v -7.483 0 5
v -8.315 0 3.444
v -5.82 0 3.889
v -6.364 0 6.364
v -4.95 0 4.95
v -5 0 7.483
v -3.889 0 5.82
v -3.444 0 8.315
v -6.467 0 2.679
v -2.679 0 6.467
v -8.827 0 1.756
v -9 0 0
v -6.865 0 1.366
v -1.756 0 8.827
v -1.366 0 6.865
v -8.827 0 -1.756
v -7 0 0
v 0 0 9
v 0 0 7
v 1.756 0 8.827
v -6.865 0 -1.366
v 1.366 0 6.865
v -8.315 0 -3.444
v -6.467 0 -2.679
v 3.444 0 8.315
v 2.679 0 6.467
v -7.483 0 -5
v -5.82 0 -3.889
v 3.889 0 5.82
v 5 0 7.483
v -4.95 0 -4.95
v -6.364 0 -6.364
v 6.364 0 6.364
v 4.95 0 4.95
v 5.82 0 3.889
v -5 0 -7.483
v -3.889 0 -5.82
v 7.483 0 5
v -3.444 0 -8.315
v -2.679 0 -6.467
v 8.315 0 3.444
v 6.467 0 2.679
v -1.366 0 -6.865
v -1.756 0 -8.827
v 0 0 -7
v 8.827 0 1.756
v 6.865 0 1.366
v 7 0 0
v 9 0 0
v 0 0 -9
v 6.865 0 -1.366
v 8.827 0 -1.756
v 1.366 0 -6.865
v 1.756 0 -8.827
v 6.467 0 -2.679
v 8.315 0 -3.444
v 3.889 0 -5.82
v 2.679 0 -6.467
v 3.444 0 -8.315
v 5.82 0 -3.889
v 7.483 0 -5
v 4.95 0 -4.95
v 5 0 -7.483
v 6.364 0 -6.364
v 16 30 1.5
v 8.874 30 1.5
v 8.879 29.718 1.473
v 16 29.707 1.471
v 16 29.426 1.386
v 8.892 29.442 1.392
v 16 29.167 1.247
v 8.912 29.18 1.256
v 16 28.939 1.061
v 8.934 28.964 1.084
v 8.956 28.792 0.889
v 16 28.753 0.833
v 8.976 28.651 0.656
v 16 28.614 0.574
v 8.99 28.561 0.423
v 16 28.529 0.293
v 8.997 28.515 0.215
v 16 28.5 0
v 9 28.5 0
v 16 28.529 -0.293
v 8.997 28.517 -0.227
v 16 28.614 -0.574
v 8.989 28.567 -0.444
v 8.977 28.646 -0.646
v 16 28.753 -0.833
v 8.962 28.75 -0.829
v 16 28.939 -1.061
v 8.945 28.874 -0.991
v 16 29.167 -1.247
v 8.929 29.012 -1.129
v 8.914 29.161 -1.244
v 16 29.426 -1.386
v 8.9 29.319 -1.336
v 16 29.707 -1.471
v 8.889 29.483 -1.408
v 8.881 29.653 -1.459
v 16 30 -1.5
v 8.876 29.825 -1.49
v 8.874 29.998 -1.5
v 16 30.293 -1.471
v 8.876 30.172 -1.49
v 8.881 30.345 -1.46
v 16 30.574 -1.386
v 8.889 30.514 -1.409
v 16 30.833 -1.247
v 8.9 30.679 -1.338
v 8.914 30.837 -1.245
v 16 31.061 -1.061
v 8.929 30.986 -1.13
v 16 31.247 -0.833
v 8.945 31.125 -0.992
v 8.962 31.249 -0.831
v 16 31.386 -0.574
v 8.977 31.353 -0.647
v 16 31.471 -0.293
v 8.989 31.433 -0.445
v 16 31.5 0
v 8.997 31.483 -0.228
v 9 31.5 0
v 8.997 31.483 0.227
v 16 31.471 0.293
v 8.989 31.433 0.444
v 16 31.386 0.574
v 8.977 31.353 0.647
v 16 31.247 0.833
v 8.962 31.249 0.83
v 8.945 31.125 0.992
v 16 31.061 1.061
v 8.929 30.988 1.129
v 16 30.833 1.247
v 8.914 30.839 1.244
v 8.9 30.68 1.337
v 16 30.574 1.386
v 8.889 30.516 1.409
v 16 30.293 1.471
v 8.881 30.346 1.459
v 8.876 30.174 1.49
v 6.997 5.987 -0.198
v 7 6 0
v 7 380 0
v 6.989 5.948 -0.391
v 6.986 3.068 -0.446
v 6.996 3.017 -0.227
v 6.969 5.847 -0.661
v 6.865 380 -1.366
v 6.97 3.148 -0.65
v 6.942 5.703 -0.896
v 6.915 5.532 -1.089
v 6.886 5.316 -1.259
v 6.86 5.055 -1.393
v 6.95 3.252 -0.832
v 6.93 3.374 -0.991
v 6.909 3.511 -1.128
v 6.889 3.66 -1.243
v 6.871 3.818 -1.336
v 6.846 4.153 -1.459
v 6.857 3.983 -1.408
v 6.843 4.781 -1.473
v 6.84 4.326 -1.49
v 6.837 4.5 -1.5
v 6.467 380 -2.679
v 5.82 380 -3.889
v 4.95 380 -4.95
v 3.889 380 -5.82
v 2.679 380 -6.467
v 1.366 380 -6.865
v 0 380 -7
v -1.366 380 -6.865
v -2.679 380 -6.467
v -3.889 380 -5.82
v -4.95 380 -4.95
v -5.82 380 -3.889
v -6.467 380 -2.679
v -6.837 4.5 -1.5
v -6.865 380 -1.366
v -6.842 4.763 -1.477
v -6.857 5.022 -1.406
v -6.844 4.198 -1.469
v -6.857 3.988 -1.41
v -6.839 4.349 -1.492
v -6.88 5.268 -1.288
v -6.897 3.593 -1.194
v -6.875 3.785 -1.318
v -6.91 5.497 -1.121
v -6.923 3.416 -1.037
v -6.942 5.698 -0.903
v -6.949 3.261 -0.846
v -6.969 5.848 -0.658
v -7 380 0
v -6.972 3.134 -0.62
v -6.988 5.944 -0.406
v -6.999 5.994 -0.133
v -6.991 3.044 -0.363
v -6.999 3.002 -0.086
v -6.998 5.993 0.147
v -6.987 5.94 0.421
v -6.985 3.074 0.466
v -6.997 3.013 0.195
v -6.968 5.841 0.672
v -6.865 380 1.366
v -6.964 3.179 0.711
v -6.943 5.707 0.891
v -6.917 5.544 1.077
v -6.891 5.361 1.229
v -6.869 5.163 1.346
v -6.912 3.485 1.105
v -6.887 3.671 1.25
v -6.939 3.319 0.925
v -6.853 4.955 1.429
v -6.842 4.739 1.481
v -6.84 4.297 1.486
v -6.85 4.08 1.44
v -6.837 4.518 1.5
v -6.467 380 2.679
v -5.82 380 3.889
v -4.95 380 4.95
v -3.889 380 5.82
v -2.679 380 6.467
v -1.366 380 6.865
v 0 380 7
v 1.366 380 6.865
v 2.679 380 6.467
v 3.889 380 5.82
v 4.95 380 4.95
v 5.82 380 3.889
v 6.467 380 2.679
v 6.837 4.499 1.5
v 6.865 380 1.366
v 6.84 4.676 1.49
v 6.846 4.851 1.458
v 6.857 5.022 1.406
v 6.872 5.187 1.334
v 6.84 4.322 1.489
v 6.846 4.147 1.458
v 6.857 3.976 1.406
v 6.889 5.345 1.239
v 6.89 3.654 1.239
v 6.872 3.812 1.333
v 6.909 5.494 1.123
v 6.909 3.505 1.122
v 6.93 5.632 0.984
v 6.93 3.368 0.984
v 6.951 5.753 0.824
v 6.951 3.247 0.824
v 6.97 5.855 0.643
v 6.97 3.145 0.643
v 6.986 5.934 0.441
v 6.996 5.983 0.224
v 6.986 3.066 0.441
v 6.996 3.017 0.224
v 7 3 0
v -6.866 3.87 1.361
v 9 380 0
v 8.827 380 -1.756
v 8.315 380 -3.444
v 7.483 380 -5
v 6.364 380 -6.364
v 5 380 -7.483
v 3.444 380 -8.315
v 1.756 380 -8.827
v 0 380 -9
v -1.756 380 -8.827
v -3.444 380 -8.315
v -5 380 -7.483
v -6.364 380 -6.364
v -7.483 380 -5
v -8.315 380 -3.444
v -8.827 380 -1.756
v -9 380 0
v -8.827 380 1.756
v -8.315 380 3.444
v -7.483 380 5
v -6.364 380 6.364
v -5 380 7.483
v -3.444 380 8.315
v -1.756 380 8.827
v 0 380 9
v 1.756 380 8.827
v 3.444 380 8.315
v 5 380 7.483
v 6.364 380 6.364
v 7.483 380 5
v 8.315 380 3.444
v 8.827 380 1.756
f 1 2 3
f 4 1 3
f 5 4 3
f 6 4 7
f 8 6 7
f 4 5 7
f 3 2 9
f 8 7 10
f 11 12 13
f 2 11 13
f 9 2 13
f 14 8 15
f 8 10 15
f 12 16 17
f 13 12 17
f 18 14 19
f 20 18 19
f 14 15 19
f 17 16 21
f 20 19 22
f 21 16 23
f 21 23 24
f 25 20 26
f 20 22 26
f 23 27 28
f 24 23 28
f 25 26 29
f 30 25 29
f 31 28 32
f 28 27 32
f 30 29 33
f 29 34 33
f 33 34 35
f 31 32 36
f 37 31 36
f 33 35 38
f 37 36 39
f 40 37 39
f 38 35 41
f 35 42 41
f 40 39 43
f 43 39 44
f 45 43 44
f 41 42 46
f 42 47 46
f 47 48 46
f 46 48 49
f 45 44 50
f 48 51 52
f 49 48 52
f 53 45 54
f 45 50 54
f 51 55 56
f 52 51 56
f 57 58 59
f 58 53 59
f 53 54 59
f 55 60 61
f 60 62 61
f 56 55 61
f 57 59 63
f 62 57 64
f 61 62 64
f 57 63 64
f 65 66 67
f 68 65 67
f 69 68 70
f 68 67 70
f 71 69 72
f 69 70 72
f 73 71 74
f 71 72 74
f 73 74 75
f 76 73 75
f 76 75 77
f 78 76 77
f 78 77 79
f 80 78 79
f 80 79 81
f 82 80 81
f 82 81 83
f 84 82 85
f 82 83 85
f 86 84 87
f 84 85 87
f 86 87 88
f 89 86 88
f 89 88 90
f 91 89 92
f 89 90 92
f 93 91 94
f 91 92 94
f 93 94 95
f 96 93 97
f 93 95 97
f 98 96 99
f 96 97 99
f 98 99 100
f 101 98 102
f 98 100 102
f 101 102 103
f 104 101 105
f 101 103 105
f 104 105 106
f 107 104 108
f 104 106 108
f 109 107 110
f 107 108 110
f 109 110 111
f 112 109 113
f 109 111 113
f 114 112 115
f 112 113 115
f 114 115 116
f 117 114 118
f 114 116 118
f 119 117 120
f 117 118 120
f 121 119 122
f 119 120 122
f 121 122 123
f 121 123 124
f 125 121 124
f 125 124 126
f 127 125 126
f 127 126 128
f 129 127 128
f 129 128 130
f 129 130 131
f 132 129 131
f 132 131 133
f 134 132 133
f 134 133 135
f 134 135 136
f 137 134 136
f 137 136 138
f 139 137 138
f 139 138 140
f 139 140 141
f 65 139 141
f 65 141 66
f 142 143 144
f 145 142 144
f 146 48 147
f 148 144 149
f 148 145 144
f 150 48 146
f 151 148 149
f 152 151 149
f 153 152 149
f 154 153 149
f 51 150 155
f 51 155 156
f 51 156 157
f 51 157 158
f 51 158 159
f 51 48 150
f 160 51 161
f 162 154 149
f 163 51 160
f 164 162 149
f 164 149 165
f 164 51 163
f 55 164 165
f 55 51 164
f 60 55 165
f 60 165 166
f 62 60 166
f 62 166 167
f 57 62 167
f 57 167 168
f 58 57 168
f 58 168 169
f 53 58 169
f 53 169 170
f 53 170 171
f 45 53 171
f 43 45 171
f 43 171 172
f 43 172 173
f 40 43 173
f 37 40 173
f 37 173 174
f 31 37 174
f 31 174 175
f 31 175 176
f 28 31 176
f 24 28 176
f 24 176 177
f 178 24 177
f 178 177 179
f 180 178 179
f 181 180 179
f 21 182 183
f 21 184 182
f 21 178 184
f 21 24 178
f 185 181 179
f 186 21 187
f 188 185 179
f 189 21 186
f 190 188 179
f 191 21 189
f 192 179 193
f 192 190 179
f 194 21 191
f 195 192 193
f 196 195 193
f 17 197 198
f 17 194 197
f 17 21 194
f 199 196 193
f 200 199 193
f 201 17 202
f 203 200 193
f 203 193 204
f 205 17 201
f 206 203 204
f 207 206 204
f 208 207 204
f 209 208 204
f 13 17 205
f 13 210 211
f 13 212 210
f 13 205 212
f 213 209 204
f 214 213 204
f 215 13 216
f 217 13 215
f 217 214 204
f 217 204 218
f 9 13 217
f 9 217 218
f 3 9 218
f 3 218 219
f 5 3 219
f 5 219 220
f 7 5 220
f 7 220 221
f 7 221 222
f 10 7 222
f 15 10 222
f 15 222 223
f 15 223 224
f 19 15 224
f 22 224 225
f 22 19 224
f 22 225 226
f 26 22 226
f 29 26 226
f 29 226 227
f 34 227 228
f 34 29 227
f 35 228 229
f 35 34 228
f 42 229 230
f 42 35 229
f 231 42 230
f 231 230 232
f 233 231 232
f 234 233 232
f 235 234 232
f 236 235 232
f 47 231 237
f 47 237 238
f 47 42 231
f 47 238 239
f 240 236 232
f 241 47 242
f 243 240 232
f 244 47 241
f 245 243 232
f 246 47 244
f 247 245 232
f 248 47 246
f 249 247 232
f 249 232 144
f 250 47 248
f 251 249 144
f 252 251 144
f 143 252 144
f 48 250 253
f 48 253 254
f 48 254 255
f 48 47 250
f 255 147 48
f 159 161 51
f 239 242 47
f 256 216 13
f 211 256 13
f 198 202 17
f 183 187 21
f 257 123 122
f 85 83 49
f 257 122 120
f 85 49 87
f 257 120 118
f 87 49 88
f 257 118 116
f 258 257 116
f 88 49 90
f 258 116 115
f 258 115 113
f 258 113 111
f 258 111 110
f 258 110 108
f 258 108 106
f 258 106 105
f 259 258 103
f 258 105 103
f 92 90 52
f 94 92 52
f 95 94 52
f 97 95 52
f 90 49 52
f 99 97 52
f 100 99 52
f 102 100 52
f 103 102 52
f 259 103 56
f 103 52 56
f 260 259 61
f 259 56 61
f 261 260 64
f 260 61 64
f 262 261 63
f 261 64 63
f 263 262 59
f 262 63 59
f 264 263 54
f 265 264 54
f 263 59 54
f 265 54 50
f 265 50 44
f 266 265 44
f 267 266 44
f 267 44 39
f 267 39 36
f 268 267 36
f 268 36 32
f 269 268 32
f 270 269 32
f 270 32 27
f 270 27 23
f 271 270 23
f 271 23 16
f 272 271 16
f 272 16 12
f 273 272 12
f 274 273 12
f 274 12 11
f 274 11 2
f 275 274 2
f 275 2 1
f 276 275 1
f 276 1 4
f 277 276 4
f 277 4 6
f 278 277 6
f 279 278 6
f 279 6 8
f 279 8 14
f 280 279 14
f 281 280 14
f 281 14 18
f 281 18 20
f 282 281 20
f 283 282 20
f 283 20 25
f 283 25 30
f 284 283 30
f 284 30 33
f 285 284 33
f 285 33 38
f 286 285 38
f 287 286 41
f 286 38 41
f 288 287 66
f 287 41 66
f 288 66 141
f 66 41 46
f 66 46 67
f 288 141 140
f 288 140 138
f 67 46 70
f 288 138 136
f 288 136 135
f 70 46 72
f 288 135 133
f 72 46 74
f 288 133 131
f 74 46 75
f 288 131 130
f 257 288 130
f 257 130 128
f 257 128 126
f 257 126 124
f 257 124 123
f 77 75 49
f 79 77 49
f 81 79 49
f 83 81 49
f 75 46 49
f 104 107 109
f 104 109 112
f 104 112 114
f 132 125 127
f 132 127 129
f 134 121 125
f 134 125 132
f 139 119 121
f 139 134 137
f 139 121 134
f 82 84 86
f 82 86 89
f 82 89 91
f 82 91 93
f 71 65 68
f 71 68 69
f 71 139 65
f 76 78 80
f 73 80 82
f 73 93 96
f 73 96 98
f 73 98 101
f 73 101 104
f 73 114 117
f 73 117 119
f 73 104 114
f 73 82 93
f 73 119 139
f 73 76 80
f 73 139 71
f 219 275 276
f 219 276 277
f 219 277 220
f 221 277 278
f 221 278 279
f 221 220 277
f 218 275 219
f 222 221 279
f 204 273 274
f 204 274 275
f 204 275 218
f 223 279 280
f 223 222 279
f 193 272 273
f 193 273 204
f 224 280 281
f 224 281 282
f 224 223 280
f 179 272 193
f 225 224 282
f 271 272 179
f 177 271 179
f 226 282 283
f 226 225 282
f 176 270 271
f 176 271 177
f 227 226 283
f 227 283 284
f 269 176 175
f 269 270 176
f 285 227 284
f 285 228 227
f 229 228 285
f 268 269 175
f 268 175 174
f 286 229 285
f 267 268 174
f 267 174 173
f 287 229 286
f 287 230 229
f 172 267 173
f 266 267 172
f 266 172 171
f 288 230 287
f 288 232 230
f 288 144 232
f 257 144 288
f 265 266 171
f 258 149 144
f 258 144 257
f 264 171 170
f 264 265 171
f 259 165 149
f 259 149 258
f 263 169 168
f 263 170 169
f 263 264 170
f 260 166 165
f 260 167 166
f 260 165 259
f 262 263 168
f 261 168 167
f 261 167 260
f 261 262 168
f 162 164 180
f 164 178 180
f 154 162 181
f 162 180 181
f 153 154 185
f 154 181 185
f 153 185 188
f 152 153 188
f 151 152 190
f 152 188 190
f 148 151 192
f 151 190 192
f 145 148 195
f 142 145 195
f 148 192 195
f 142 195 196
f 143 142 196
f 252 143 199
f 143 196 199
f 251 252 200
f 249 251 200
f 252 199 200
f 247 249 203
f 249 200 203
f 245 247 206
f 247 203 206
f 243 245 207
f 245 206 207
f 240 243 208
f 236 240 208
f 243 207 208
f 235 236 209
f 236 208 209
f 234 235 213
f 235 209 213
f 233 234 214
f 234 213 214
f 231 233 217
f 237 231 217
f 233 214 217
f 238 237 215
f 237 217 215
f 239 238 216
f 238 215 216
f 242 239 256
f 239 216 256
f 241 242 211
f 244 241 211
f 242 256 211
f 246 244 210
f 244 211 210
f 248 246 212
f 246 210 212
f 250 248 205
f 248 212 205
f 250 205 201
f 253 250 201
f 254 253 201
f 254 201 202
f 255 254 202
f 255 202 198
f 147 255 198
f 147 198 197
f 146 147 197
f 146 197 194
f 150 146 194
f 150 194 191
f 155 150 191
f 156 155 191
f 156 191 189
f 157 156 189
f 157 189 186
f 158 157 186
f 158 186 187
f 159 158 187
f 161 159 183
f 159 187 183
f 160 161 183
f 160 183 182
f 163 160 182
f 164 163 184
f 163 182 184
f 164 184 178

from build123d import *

# Parameters (mm, degrees)
SKETCH1_R                            = 9
SKETCH1_R_2                          = 7
EXTRUDE_THIN1_DEPTH                  = 380
BOSS_EXTRUDE1_REACH                  = 382.213
BOSS_EXTRUDE1_END_RADIUS             = 7
SKETCH2_R                            = 1.5
BOSS_EXTRUDE1_DIRECTION_2_REACH      = 382.213
BOSS_EXTRUDE1_DIRECTION_2_END_RADIUS = 7
BOSS_EXTRUDE2_START                  = 8
SKETCH3_R                            = 1.5
BOSS_EXTRUDE2_DEPTH                  = 8


with BuildPart() as part:
    # Sketch1 → Extrude-Thin1 (new body)
    with BuildSketch(Plane(origin=(0, 0, 0), x_dir=(1, 0, 0), z_dir=(0, 1, 0))):
        Circle(SKETCH1_R)
        Circle(SKETCH1_R_2, mode=Mode.SUBTRACT)
    extrude(amount=EXTRUDE_THIN1_DEPTH)

    # Boss-Extrude1: up to this cylinder (the profile starts inside it)
    boss_extrude1_end = Plane(origin=(0, 4.5, 0), z_dir=(0, -1, 0)) * Cylinder(BOSS_EXTRUDE1_END_RADIUS, 779.426, mode=Mode.PRIVATE)
    # Sketch2 → Boss-Extrude1 (add, up to the surface)
    with BuildSketch(Plane(origin=(0, 0, 0), x_dir=(0, 0, -1), z_dir=(1, 0, 0)), mode=Mode.PRIVATE) as boss_extrude1_sk1:
        with Locations((0, 4.5)):
            Circle(SKETCH2_R)
    boss_extrude1_tool1 = extrude(boss_extrude1_sk1.sketch, amount=BOSS_EXTRUDE1_REACH, mode=Mode.PRIVATE) & boss_extrude1_end
    add(boss_extrude1_tool1.solids().sort_by_distance((0, 4.5, 0))[0])

    # Boss-Extrude1 direction 2: up to this cylinder (the profile starts inside it)
    boss_extrude1_direction_2_end = Plane(origin=(0, 4.5, 0), z_dir=(0, -1, 0)) * Cylinder(BOSS_EXTRUDE1_DIRECTION_2_END_RADIUS, 779.426, mode=Mode.PRIVATE)
    # Sketch2 → Boss-Extrude1 direction 2 (add, up to the surface)
    with BuildSketch(Plane(origin=(0, 0, 0), x_dir=(0, 0, -1), z_dir=(1, 0, 0)), mode=Mode.PRIVATE) as boss_extrude1_direction_2_sk1:
        with Locations((0, 4.5)):
            Circle(SKETCH2_R)
    boss_extrude1_direction_2_tool1 = extrude(boss_extrude1_direction_2_sk1.sketch, amount=-BOSS_EXTRUDE1_DIRECTION_2_REACH, mode=Mode.PRIVATE) & boss_extrude1_direction_2_end
    add(boss_extrude1_direction_2_tool1.solids().sort_by_distance((0, 4.5, 0))[0])

    # Sketch3 → Boss-Extrude2 (add)
    with BuildSketch(Plane(origin=(0, 0, 0), x_dir=(0, 0, -1), z_dir=(1, 0, 0)).offset(BOSS_EXTRUDE2_START)):
        with Locations(Location((0, 30, 0), (0, 0, 180))):
            Circle(SKETCH3_R)
    extrude(amount=BOSS_EXTRUDE2_DEPTH)


solid = part.part
